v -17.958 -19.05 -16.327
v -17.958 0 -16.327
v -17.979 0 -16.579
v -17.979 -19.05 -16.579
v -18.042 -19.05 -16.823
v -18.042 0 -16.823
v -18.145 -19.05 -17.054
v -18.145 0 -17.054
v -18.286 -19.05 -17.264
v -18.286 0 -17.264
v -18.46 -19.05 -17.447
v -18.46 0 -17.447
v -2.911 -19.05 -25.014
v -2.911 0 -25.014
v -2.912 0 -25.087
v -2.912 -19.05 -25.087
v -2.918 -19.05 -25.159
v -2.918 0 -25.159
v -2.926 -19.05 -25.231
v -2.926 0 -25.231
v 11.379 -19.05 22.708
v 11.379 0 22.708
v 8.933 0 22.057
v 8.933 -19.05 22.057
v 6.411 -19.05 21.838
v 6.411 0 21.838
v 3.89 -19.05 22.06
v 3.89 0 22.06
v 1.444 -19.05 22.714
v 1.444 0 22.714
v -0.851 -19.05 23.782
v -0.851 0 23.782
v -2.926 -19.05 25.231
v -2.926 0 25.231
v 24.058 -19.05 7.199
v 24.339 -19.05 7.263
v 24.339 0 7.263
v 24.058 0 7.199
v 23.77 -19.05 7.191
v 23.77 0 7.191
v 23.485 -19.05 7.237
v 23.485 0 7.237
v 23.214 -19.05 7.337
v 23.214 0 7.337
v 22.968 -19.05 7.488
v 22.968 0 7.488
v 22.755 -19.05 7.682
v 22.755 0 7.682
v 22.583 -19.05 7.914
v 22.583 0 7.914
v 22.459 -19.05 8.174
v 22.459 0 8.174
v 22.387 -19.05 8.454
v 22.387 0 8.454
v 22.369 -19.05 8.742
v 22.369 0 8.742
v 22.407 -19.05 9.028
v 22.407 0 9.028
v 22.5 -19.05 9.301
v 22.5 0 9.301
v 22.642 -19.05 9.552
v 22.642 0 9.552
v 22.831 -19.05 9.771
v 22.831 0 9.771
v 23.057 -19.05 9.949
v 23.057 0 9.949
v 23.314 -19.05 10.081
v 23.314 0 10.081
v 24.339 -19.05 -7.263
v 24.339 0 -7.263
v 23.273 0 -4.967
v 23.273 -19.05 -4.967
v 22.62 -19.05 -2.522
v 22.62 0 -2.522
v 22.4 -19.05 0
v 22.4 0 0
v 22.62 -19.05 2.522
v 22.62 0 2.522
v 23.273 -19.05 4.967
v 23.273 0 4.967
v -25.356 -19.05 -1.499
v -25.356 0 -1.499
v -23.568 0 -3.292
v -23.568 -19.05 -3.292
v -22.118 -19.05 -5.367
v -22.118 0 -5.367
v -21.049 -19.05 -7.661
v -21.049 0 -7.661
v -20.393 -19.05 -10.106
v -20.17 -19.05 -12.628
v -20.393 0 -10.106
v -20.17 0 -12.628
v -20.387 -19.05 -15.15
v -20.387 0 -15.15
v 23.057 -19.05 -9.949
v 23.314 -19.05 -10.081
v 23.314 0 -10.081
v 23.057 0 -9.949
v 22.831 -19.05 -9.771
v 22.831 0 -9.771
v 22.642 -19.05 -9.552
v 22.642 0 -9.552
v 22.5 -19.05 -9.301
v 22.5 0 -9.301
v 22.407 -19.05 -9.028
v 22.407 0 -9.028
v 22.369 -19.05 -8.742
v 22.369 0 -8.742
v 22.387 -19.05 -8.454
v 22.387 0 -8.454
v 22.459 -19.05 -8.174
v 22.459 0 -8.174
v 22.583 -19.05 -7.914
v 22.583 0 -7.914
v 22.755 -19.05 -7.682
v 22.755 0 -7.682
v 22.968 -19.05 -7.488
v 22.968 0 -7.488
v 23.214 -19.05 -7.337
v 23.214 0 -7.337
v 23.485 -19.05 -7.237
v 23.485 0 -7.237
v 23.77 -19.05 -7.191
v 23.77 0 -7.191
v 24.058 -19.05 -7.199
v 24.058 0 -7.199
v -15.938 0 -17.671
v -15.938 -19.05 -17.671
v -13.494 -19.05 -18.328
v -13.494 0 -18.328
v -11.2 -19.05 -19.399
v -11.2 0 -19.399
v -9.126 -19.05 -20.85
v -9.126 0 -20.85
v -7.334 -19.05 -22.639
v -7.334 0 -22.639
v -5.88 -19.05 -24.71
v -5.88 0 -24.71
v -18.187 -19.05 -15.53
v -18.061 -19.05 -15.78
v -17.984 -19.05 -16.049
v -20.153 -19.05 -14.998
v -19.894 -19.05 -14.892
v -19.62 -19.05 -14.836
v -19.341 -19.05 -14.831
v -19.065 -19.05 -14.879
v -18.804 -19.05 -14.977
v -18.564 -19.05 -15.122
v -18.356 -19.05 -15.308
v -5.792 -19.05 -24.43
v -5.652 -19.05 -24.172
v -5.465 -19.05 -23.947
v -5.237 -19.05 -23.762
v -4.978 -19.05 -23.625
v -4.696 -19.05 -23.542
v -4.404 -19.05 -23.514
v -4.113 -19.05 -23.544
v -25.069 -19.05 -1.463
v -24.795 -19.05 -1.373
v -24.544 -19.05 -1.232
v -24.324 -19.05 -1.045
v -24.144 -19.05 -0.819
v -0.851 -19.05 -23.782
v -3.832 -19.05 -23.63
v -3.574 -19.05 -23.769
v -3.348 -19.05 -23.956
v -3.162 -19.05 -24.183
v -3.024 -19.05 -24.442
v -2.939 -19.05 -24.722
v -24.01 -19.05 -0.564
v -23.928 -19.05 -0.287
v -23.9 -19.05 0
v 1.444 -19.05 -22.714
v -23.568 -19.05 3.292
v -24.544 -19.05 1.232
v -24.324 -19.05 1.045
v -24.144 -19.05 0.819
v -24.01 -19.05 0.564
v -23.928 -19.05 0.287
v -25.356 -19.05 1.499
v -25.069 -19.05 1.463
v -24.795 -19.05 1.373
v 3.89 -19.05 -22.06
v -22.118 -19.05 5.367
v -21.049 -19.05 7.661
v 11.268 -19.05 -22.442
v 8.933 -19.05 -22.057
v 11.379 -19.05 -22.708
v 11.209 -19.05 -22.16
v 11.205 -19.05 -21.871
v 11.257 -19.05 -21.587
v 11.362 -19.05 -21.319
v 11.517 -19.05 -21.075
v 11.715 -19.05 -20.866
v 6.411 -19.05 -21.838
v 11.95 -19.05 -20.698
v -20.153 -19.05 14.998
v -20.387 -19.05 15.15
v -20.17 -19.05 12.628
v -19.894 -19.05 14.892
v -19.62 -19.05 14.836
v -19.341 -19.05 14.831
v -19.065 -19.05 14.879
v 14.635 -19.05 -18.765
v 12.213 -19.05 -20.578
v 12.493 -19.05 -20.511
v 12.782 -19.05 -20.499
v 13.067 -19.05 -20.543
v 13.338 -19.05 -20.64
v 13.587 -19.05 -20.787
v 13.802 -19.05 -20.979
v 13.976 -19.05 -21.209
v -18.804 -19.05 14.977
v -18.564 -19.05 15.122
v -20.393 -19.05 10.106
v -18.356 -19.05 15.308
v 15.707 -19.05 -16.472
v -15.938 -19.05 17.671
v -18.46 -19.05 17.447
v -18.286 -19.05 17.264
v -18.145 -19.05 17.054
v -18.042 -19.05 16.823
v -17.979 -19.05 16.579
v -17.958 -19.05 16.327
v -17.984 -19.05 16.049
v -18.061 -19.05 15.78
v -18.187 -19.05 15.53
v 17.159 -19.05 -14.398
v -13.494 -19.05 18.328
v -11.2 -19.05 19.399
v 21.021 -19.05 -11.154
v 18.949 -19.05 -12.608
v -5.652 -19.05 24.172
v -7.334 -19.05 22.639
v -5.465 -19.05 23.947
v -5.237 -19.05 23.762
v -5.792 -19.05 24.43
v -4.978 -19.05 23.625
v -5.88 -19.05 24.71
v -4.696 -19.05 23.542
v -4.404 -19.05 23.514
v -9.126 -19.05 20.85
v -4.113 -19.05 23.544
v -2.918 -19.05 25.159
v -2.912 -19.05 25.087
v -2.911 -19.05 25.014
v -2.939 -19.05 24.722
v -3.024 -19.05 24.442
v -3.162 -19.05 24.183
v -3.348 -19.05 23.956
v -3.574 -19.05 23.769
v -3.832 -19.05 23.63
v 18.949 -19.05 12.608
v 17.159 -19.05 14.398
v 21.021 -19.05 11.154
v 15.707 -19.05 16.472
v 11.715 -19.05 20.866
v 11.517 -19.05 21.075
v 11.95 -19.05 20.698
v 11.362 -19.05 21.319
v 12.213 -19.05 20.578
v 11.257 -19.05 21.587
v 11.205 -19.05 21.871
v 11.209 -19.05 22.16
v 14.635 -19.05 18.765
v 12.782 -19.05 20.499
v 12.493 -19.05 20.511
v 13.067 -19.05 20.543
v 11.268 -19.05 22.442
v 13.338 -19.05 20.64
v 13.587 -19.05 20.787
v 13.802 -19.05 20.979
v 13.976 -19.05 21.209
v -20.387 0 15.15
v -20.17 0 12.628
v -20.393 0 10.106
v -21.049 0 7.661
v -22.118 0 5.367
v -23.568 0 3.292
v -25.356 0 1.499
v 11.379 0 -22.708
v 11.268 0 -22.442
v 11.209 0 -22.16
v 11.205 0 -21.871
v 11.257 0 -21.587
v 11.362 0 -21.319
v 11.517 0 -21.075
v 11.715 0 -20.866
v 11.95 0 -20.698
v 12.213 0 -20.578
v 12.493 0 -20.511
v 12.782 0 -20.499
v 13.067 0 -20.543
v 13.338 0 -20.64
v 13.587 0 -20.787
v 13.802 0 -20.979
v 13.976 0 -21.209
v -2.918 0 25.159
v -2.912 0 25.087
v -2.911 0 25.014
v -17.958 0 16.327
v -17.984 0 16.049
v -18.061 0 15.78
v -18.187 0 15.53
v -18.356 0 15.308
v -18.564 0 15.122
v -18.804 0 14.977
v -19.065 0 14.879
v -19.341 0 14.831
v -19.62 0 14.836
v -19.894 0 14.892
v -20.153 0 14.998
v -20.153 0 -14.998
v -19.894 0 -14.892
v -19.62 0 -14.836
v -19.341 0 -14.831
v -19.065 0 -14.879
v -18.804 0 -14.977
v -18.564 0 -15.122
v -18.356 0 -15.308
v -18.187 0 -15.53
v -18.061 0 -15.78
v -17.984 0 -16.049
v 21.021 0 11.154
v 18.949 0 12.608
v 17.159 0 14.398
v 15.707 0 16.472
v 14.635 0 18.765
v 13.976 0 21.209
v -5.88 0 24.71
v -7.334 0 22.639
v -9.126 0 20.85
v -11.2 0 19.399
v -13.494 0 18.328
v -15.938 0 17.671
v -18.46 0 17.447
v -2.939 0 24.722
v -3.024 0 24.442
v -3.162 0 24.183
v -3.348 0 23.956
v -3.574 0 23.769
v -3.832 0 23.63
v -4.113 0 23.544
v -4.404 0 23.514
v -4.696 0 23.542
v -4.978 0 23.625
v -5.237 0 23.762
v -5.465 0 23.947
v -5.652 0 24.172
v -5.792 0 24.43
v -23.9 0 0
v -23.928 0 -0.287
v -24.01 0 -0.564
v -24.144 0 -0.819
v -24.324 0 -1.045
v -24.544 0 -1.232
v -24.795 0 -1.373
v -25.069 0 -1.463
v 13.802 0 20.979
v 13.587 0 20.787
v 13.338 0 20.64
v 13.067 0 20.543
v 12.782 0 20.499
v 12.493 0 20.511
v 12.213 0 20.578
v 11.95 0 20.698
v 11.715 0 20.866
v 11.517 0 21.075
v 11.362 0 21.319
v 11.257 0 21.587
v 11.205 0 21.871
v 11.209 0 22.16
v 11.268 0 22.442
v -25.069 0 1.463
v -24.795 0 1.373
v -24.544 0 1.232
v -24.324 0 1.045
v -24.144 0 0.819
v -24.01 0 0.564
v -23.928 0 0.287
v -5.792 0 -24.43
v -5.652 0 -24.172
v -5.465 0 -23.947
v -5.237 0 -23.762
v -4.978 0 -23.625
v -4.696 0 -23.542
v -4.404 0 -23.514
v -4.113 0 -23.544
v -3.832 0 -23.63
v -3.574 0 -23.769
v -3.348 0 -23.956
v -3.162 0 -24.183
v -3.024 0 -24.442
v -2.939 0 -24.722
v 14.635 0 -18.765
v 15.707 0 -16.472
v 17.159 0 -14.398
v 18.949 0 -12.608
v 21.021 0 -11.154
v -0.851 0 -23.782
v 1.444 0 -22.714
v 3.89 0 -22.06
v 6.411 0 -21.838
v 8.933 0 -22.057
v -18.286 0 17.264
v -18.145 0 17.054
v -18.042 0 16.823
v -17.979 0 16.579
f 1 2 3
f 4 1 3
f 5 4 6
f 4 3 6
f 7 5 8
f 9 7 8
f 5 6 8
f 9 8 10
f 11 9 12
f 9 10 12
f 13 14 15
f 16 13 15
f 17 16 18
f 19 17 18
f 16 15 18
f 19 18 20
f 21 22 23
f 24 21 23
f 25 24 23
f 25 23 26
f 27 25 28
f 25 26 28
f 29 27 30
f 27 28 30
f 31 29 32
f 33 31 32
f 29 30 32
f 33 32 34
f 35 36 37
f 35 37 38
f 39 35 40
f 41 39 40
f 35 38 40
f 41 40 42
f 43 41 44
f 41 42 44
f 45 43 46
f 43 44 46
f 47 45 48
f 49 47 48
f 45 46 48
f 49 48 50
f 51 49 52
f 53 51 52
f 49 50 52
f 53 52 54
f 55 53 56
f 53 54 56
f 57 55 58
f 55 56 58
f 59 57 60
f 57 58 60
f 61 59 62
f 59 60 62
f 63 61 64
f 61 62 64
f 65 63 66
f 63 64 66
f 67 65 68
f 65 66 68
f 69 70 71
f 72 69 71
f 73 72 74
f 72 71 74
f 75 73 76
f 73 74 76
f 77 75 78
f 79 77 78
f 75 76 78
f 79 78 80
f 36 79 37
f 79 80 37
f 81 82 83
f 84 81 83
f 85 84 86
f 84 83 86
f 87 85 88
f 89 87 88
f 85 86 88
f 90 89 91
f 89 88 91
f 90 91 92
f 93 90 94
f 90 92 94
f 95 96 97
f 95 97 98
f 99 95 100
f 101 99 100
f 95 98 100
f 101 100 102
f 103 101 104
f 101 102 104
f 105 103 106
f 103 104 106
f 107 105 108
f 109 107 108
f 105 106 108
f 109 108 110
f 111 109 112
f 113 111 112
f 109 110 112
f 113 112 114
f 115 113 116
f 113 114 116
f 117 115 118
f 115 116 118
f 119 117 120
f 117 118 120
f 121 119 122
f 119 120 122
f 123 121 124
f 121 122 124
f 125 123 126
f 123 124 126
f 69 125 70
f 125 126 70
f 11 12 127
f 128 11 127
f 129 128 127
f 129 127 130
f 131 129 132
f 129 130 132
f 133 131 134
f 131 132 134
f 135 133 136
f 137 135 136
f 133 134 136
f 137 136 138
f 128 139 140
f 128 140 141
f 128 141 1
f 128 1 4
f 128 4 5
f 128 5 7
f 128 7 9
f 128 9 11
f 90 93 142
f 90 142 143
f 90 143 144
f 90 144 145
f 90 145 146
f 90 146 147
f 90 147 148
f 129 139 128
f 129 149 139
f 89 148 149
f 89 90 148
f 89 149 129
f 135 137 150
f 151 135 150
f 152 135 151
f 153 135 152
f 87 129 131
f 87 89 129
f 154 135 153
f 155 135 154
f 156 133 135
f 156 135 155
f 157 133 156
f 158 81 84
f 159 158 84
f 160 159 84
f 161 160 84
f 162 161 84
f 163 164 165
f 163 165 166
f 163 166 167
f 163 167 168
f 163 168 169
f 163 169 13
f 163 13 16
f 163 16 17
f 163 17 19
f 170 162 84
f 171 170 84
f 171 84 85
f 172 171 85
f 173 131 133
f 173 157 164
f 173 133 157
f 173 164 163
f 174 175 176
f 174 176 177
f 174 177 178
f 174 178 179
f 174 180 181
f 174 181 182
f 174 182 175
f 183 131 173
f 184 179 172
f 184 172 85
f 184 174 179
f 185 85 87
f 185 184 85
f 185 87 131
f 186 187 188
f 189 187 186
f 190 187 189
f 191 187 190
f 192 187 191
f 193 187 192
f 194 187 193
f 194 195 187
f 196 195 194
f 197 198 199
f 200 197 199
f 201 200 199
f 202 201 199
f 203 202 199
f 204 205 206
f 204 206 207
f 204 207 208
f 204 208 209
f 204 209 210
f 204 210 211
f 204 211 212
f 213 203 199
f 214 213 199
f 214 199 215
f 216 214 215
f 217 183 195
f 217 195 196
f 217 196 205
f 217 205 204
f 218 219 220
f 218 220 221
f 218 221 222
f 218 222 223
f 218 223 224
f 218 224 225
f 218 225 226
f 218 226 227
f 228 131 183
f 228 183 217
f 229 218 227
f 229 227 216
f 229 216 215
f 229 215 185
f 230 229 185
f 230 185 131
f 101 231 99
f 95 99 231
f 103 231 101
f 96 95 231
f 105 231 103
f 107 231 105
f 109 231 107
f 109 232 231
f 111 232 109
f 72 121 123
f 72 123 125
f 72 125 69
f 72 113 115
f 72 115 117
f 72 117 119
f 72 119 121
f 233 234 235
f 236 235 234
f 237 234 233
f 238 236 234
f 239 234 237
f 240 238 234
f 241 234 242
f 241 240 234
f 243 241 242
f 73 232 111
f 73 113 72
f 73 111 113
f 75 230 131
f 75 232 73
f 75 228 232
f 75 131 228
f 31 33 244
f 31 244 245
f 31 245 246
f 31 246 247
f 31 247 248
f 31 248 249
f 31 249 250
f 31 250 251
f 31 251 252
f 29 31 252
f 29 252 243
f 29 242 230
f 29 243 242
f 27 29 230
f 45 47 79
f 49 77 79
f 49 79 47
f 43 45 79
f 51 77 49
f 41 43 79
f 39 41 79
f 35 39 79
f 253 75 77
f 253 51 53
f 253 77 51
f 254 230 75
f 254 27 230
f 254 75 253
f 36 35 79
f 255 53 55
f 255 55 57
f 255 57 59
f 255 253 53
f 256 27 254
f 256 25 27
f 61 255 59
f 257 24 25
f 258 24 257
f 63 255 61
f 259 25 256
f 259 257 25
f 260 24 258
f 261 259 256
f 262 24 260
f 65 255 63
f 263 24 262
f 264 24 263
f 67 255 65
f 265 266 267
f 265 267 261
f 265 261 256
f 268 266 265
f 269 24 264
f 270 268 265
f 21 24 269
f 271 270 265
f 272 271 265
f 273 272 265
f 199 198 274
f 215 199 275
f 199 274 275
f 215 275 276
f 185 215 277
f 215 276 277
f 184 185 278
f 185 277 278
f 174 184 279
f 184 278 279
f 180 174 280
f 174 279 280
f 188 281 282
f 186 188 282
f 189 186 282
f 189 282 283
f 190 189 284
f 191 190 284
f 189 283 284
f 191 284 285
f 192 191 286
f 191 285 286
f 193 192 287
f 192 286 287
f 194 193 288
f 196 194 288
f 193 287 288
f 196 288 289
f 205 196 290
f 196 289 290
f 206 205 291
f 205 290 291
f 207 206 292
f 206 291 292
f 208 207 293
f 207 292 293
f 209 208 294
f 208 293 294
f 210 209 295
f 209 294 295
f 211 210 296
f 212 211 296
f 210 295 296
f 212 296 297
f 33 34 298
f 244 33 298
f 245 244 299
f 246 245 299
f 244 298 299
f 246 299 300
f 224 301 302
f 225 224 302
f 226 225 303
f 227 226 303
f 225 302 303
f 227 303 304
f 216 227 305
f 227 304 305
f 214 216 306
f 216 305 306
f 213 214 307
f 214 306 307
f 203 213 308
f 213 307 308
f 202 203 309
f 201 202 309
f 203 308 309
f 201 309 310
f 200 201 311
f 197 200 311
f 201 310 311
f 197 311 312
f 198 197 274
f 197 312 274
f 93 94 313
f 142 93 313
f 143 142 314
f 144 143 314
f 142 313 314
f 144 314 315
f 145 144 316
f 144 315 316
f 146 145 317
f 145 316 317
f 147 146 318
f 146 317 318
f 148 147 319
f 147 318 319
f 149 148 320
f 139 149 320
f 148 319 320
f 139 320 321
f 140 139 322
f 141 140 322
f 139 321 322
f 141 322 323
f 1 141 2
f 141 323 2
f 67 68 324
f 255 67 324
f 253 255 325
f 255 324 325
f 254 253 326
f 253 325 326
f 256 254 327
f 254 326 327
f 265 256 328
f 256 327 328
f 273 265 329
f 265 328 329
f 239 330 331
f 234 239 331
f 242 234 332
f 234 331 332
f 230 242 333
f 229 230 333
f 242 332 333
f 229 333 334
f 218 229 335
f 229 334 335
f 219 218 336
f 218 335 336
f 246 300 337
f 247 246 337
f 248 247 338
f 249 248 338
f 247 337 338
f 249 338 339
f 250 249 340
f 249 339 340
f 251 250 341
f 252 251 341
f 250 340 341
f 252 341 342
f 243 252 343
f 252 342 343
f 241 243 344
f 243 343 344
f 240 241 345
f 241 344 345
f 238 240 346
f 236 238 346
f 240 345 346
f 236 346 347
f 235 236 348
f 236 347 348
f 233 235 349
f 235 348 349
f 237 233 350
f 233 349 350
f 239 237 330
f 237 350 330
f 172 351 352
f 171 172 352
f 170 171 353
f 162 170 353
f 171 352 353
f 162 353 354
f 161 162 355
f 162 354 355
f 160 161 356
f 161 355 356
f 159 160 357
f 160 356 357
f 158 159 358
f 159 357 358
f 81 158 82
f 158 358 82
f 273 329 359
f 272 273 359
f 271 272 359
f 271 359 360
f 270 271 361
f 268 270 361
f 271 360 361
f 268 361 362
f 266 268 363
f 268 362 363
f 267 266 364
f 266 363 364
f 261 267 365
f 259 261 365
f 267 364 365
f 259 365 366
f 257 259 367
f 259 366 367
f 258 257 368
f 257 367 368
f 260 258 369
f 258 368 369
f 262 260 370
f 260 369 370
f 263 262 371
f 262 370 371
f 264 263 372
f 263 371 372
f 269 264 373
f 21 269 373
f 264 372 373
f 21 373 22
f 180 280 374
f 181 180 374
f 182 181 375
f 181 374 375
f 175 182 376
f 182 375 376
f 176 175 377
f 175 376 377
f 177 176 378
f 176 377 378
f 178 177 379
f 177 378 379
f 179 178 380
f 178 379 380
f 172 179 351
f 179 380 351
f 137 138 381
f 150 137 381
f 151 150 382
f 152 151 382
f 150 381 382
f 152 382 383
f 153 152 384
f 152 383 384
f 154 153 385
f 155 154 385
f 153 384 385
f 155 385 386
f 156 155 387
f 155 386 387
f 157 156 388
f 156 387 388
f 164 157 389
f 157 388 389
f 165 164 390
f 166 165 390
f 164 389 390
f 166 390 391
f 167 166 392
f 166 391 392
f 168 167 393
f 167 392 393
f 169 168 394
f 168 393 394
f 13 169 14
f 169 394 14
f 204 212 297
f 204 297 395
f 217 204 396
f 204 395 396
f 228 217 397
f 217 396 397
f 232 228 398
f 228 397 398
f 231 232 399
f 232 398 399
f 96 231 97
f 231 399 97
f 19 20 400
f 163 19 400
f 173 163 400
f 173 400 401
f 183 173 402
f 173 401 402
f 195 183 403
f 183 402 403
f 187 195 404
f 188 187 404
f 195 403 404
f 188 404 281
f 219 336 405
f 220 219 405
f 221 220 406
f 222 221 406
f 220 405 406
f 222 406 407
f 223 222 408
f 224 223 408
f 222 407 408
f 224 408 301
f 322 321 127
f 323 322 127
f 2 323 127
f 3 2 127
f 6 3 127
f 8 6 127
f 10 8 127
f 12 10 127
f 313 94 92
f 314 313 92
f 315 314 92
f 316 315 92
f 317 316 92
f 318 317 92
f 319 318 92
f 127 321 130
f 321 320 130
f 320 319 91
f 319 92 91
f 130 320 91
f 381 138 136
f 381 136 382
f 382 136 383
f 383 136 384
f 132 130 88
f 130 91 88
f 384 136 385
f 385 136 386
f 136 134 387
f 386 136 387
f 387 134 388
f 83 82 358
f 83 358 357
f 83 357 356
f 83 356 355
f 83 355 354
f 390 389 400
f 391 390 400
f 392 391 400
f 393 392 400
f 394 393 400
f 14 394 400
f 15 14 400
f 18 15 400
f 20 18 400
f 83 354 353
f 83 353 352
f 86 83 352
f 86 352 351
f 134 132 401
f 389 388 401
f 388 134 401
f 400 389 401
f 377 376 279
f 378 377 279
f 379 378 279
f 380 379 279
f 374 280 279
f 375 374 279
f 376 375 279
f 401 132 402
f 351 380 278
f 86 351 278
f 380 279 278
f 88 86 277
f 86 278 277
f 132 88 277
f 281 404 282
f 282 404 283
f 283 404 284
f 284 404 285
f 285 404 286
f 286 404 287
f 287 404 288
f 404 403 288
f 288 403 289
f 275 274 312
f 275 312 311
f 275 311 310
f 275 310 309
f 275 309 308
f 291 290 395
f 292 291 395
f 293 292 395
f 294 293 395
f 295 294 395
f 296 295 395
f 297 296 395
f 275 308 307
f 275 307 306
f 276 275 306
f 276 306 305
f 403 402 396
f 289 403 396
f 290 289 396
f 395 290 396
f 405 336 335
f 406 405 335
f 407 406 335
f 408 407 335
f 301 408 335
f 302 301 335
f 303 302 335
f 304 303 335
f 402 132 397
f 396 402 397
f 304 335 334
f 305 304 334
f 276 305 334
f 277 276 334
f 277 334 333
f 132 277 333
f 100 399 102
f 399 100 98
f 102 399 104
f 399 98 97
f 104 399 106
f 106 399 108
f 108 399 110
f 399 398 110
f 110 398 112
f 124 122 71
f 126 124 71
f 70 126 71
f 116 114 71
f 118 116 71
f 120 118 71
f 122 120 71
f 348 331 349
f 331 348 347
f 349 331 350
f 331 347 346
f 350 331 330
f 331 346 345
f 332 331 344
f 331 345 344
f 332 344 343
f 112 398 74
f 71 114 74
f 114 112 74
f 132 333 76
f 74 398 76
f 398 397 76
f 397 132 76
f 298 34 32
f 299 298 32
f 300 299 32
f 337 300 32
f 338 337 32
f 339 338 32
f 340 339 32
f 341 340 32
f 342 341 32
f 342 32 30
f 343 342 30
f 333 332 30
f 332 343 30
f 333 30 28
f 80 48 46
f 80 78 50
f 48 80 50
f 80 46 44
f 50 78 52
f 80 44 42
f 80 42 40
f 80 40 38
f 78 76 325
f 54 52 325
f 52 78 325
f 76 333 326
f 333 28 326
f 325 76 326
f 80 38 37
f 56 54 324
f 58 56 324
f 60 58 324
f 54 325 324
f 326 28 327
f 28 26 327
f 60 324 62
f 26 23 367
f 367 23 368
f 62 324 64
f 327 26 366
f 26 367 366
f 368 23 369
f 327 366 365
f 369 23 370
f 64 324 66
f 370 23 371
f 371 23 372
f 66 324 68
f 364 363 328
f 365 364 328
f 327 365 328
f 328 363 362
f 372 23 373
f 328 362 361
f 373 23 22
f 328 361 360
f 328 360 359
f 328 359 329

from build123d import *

# Parameters (mm, degrees)
F1_DEPTH = 19.05


with BuildPart() as f1:
    # F0 (on Front) → F1 (new body)
    with BuildSketch(Plane.XZ):
        with BuildLine():
            ThreePointArc((24.339379, -7.263239), (22.4, 0), (24.339379, 7.263239))
            ThreePointArc((24.339379, 7.263239), (22.458654, 8.174281), (23.313766, 10.081087))
            ThreePointArc((23.313766, 10.081087), (17.159396, 14.398442), (13.976326, 21.209015))
            ThreePointArc((13.976326, 21.209015), (11.95, 20.698007), (11.379383, 22.708361))
            ThreePointArc((11.379383, 22.708361), (3.889719, 22.059694), (-2.926405, 25.230857))
            ThreePointArc((-2.926405, 25.230857), (-2.914604, 25.122772), (-2.910664, 25.014117))
            ThreePointArc((-2.910664, 25.014117), (-4.257881, 23.521918), (-5.87954, 24.71014))
            ThreePointArc((-5.87954, 24.71014), (-11.2, 19.398969), (-18.459839, 17.446901))
            ThreePointArc((-18.459839, 17.446901), (-18.088855, 16.940591), (-17.957529, 16.326805))
            ThreePointArc((-17.957529, 16.326805), (-18.803598, 14.976852), (-20.387361, 15.14977))
            ThreePointArc((-20.387361, 15.14977), (-21.049115, 7.661251), (-25.355709, 1.499346))
            ThreePointArc((-25.355709, 1.499346), (-24.323794, 1.044883), (-23.9, 0))
            ThreePointArc((-23.9, 0), (-24.323794, -1.044883), (-25.355709, -1.499346))
            ThreePointArc((-25.355709, -1.499346), (-21.049115, -7.661251), (-20.387361, -15.14977))
            ThreePointArc((-20.387361, -15.14977), (-18.803598, -14.976852), (-17.957529, -16.326805))
            ThreePointArc((-17.957529, -16.326805), (-18.088855, -16.940591), (-18.459839, -17.446901))
            ThreePointArc((-18.459839, -17.446901), (-11.2, -19.398969), (-5.87954, -24.71014))
            ThreePointArc((-5.87954, -24.71014), (-4.257881, -23.521918), (-2.910664, -25.014117))
            ThreePointArc((-2.910664, -25.014117), (-2.914604, -25.122772), (-2.926405, -25.230857))
            ThreePointArc((-2.926405, -25.230857), (3.889719, -22.059694), (11.379383, -22.708361))
            ThreePointArc((11.379383, -22.708361), (11.95, -20.698007), (13.976326, -21.209015))
            ThreePointArc((13.976326, -21.209015), (17.159396, -14.398442), (23.313766, -10.081087))
            ThreePointArc((23.313766, -10.081087), (22.458654, -8.174281), (24.339379, -7.263239))
        make_face()
    extrude(amount=F1_DEPTH)


solid = f1.part
